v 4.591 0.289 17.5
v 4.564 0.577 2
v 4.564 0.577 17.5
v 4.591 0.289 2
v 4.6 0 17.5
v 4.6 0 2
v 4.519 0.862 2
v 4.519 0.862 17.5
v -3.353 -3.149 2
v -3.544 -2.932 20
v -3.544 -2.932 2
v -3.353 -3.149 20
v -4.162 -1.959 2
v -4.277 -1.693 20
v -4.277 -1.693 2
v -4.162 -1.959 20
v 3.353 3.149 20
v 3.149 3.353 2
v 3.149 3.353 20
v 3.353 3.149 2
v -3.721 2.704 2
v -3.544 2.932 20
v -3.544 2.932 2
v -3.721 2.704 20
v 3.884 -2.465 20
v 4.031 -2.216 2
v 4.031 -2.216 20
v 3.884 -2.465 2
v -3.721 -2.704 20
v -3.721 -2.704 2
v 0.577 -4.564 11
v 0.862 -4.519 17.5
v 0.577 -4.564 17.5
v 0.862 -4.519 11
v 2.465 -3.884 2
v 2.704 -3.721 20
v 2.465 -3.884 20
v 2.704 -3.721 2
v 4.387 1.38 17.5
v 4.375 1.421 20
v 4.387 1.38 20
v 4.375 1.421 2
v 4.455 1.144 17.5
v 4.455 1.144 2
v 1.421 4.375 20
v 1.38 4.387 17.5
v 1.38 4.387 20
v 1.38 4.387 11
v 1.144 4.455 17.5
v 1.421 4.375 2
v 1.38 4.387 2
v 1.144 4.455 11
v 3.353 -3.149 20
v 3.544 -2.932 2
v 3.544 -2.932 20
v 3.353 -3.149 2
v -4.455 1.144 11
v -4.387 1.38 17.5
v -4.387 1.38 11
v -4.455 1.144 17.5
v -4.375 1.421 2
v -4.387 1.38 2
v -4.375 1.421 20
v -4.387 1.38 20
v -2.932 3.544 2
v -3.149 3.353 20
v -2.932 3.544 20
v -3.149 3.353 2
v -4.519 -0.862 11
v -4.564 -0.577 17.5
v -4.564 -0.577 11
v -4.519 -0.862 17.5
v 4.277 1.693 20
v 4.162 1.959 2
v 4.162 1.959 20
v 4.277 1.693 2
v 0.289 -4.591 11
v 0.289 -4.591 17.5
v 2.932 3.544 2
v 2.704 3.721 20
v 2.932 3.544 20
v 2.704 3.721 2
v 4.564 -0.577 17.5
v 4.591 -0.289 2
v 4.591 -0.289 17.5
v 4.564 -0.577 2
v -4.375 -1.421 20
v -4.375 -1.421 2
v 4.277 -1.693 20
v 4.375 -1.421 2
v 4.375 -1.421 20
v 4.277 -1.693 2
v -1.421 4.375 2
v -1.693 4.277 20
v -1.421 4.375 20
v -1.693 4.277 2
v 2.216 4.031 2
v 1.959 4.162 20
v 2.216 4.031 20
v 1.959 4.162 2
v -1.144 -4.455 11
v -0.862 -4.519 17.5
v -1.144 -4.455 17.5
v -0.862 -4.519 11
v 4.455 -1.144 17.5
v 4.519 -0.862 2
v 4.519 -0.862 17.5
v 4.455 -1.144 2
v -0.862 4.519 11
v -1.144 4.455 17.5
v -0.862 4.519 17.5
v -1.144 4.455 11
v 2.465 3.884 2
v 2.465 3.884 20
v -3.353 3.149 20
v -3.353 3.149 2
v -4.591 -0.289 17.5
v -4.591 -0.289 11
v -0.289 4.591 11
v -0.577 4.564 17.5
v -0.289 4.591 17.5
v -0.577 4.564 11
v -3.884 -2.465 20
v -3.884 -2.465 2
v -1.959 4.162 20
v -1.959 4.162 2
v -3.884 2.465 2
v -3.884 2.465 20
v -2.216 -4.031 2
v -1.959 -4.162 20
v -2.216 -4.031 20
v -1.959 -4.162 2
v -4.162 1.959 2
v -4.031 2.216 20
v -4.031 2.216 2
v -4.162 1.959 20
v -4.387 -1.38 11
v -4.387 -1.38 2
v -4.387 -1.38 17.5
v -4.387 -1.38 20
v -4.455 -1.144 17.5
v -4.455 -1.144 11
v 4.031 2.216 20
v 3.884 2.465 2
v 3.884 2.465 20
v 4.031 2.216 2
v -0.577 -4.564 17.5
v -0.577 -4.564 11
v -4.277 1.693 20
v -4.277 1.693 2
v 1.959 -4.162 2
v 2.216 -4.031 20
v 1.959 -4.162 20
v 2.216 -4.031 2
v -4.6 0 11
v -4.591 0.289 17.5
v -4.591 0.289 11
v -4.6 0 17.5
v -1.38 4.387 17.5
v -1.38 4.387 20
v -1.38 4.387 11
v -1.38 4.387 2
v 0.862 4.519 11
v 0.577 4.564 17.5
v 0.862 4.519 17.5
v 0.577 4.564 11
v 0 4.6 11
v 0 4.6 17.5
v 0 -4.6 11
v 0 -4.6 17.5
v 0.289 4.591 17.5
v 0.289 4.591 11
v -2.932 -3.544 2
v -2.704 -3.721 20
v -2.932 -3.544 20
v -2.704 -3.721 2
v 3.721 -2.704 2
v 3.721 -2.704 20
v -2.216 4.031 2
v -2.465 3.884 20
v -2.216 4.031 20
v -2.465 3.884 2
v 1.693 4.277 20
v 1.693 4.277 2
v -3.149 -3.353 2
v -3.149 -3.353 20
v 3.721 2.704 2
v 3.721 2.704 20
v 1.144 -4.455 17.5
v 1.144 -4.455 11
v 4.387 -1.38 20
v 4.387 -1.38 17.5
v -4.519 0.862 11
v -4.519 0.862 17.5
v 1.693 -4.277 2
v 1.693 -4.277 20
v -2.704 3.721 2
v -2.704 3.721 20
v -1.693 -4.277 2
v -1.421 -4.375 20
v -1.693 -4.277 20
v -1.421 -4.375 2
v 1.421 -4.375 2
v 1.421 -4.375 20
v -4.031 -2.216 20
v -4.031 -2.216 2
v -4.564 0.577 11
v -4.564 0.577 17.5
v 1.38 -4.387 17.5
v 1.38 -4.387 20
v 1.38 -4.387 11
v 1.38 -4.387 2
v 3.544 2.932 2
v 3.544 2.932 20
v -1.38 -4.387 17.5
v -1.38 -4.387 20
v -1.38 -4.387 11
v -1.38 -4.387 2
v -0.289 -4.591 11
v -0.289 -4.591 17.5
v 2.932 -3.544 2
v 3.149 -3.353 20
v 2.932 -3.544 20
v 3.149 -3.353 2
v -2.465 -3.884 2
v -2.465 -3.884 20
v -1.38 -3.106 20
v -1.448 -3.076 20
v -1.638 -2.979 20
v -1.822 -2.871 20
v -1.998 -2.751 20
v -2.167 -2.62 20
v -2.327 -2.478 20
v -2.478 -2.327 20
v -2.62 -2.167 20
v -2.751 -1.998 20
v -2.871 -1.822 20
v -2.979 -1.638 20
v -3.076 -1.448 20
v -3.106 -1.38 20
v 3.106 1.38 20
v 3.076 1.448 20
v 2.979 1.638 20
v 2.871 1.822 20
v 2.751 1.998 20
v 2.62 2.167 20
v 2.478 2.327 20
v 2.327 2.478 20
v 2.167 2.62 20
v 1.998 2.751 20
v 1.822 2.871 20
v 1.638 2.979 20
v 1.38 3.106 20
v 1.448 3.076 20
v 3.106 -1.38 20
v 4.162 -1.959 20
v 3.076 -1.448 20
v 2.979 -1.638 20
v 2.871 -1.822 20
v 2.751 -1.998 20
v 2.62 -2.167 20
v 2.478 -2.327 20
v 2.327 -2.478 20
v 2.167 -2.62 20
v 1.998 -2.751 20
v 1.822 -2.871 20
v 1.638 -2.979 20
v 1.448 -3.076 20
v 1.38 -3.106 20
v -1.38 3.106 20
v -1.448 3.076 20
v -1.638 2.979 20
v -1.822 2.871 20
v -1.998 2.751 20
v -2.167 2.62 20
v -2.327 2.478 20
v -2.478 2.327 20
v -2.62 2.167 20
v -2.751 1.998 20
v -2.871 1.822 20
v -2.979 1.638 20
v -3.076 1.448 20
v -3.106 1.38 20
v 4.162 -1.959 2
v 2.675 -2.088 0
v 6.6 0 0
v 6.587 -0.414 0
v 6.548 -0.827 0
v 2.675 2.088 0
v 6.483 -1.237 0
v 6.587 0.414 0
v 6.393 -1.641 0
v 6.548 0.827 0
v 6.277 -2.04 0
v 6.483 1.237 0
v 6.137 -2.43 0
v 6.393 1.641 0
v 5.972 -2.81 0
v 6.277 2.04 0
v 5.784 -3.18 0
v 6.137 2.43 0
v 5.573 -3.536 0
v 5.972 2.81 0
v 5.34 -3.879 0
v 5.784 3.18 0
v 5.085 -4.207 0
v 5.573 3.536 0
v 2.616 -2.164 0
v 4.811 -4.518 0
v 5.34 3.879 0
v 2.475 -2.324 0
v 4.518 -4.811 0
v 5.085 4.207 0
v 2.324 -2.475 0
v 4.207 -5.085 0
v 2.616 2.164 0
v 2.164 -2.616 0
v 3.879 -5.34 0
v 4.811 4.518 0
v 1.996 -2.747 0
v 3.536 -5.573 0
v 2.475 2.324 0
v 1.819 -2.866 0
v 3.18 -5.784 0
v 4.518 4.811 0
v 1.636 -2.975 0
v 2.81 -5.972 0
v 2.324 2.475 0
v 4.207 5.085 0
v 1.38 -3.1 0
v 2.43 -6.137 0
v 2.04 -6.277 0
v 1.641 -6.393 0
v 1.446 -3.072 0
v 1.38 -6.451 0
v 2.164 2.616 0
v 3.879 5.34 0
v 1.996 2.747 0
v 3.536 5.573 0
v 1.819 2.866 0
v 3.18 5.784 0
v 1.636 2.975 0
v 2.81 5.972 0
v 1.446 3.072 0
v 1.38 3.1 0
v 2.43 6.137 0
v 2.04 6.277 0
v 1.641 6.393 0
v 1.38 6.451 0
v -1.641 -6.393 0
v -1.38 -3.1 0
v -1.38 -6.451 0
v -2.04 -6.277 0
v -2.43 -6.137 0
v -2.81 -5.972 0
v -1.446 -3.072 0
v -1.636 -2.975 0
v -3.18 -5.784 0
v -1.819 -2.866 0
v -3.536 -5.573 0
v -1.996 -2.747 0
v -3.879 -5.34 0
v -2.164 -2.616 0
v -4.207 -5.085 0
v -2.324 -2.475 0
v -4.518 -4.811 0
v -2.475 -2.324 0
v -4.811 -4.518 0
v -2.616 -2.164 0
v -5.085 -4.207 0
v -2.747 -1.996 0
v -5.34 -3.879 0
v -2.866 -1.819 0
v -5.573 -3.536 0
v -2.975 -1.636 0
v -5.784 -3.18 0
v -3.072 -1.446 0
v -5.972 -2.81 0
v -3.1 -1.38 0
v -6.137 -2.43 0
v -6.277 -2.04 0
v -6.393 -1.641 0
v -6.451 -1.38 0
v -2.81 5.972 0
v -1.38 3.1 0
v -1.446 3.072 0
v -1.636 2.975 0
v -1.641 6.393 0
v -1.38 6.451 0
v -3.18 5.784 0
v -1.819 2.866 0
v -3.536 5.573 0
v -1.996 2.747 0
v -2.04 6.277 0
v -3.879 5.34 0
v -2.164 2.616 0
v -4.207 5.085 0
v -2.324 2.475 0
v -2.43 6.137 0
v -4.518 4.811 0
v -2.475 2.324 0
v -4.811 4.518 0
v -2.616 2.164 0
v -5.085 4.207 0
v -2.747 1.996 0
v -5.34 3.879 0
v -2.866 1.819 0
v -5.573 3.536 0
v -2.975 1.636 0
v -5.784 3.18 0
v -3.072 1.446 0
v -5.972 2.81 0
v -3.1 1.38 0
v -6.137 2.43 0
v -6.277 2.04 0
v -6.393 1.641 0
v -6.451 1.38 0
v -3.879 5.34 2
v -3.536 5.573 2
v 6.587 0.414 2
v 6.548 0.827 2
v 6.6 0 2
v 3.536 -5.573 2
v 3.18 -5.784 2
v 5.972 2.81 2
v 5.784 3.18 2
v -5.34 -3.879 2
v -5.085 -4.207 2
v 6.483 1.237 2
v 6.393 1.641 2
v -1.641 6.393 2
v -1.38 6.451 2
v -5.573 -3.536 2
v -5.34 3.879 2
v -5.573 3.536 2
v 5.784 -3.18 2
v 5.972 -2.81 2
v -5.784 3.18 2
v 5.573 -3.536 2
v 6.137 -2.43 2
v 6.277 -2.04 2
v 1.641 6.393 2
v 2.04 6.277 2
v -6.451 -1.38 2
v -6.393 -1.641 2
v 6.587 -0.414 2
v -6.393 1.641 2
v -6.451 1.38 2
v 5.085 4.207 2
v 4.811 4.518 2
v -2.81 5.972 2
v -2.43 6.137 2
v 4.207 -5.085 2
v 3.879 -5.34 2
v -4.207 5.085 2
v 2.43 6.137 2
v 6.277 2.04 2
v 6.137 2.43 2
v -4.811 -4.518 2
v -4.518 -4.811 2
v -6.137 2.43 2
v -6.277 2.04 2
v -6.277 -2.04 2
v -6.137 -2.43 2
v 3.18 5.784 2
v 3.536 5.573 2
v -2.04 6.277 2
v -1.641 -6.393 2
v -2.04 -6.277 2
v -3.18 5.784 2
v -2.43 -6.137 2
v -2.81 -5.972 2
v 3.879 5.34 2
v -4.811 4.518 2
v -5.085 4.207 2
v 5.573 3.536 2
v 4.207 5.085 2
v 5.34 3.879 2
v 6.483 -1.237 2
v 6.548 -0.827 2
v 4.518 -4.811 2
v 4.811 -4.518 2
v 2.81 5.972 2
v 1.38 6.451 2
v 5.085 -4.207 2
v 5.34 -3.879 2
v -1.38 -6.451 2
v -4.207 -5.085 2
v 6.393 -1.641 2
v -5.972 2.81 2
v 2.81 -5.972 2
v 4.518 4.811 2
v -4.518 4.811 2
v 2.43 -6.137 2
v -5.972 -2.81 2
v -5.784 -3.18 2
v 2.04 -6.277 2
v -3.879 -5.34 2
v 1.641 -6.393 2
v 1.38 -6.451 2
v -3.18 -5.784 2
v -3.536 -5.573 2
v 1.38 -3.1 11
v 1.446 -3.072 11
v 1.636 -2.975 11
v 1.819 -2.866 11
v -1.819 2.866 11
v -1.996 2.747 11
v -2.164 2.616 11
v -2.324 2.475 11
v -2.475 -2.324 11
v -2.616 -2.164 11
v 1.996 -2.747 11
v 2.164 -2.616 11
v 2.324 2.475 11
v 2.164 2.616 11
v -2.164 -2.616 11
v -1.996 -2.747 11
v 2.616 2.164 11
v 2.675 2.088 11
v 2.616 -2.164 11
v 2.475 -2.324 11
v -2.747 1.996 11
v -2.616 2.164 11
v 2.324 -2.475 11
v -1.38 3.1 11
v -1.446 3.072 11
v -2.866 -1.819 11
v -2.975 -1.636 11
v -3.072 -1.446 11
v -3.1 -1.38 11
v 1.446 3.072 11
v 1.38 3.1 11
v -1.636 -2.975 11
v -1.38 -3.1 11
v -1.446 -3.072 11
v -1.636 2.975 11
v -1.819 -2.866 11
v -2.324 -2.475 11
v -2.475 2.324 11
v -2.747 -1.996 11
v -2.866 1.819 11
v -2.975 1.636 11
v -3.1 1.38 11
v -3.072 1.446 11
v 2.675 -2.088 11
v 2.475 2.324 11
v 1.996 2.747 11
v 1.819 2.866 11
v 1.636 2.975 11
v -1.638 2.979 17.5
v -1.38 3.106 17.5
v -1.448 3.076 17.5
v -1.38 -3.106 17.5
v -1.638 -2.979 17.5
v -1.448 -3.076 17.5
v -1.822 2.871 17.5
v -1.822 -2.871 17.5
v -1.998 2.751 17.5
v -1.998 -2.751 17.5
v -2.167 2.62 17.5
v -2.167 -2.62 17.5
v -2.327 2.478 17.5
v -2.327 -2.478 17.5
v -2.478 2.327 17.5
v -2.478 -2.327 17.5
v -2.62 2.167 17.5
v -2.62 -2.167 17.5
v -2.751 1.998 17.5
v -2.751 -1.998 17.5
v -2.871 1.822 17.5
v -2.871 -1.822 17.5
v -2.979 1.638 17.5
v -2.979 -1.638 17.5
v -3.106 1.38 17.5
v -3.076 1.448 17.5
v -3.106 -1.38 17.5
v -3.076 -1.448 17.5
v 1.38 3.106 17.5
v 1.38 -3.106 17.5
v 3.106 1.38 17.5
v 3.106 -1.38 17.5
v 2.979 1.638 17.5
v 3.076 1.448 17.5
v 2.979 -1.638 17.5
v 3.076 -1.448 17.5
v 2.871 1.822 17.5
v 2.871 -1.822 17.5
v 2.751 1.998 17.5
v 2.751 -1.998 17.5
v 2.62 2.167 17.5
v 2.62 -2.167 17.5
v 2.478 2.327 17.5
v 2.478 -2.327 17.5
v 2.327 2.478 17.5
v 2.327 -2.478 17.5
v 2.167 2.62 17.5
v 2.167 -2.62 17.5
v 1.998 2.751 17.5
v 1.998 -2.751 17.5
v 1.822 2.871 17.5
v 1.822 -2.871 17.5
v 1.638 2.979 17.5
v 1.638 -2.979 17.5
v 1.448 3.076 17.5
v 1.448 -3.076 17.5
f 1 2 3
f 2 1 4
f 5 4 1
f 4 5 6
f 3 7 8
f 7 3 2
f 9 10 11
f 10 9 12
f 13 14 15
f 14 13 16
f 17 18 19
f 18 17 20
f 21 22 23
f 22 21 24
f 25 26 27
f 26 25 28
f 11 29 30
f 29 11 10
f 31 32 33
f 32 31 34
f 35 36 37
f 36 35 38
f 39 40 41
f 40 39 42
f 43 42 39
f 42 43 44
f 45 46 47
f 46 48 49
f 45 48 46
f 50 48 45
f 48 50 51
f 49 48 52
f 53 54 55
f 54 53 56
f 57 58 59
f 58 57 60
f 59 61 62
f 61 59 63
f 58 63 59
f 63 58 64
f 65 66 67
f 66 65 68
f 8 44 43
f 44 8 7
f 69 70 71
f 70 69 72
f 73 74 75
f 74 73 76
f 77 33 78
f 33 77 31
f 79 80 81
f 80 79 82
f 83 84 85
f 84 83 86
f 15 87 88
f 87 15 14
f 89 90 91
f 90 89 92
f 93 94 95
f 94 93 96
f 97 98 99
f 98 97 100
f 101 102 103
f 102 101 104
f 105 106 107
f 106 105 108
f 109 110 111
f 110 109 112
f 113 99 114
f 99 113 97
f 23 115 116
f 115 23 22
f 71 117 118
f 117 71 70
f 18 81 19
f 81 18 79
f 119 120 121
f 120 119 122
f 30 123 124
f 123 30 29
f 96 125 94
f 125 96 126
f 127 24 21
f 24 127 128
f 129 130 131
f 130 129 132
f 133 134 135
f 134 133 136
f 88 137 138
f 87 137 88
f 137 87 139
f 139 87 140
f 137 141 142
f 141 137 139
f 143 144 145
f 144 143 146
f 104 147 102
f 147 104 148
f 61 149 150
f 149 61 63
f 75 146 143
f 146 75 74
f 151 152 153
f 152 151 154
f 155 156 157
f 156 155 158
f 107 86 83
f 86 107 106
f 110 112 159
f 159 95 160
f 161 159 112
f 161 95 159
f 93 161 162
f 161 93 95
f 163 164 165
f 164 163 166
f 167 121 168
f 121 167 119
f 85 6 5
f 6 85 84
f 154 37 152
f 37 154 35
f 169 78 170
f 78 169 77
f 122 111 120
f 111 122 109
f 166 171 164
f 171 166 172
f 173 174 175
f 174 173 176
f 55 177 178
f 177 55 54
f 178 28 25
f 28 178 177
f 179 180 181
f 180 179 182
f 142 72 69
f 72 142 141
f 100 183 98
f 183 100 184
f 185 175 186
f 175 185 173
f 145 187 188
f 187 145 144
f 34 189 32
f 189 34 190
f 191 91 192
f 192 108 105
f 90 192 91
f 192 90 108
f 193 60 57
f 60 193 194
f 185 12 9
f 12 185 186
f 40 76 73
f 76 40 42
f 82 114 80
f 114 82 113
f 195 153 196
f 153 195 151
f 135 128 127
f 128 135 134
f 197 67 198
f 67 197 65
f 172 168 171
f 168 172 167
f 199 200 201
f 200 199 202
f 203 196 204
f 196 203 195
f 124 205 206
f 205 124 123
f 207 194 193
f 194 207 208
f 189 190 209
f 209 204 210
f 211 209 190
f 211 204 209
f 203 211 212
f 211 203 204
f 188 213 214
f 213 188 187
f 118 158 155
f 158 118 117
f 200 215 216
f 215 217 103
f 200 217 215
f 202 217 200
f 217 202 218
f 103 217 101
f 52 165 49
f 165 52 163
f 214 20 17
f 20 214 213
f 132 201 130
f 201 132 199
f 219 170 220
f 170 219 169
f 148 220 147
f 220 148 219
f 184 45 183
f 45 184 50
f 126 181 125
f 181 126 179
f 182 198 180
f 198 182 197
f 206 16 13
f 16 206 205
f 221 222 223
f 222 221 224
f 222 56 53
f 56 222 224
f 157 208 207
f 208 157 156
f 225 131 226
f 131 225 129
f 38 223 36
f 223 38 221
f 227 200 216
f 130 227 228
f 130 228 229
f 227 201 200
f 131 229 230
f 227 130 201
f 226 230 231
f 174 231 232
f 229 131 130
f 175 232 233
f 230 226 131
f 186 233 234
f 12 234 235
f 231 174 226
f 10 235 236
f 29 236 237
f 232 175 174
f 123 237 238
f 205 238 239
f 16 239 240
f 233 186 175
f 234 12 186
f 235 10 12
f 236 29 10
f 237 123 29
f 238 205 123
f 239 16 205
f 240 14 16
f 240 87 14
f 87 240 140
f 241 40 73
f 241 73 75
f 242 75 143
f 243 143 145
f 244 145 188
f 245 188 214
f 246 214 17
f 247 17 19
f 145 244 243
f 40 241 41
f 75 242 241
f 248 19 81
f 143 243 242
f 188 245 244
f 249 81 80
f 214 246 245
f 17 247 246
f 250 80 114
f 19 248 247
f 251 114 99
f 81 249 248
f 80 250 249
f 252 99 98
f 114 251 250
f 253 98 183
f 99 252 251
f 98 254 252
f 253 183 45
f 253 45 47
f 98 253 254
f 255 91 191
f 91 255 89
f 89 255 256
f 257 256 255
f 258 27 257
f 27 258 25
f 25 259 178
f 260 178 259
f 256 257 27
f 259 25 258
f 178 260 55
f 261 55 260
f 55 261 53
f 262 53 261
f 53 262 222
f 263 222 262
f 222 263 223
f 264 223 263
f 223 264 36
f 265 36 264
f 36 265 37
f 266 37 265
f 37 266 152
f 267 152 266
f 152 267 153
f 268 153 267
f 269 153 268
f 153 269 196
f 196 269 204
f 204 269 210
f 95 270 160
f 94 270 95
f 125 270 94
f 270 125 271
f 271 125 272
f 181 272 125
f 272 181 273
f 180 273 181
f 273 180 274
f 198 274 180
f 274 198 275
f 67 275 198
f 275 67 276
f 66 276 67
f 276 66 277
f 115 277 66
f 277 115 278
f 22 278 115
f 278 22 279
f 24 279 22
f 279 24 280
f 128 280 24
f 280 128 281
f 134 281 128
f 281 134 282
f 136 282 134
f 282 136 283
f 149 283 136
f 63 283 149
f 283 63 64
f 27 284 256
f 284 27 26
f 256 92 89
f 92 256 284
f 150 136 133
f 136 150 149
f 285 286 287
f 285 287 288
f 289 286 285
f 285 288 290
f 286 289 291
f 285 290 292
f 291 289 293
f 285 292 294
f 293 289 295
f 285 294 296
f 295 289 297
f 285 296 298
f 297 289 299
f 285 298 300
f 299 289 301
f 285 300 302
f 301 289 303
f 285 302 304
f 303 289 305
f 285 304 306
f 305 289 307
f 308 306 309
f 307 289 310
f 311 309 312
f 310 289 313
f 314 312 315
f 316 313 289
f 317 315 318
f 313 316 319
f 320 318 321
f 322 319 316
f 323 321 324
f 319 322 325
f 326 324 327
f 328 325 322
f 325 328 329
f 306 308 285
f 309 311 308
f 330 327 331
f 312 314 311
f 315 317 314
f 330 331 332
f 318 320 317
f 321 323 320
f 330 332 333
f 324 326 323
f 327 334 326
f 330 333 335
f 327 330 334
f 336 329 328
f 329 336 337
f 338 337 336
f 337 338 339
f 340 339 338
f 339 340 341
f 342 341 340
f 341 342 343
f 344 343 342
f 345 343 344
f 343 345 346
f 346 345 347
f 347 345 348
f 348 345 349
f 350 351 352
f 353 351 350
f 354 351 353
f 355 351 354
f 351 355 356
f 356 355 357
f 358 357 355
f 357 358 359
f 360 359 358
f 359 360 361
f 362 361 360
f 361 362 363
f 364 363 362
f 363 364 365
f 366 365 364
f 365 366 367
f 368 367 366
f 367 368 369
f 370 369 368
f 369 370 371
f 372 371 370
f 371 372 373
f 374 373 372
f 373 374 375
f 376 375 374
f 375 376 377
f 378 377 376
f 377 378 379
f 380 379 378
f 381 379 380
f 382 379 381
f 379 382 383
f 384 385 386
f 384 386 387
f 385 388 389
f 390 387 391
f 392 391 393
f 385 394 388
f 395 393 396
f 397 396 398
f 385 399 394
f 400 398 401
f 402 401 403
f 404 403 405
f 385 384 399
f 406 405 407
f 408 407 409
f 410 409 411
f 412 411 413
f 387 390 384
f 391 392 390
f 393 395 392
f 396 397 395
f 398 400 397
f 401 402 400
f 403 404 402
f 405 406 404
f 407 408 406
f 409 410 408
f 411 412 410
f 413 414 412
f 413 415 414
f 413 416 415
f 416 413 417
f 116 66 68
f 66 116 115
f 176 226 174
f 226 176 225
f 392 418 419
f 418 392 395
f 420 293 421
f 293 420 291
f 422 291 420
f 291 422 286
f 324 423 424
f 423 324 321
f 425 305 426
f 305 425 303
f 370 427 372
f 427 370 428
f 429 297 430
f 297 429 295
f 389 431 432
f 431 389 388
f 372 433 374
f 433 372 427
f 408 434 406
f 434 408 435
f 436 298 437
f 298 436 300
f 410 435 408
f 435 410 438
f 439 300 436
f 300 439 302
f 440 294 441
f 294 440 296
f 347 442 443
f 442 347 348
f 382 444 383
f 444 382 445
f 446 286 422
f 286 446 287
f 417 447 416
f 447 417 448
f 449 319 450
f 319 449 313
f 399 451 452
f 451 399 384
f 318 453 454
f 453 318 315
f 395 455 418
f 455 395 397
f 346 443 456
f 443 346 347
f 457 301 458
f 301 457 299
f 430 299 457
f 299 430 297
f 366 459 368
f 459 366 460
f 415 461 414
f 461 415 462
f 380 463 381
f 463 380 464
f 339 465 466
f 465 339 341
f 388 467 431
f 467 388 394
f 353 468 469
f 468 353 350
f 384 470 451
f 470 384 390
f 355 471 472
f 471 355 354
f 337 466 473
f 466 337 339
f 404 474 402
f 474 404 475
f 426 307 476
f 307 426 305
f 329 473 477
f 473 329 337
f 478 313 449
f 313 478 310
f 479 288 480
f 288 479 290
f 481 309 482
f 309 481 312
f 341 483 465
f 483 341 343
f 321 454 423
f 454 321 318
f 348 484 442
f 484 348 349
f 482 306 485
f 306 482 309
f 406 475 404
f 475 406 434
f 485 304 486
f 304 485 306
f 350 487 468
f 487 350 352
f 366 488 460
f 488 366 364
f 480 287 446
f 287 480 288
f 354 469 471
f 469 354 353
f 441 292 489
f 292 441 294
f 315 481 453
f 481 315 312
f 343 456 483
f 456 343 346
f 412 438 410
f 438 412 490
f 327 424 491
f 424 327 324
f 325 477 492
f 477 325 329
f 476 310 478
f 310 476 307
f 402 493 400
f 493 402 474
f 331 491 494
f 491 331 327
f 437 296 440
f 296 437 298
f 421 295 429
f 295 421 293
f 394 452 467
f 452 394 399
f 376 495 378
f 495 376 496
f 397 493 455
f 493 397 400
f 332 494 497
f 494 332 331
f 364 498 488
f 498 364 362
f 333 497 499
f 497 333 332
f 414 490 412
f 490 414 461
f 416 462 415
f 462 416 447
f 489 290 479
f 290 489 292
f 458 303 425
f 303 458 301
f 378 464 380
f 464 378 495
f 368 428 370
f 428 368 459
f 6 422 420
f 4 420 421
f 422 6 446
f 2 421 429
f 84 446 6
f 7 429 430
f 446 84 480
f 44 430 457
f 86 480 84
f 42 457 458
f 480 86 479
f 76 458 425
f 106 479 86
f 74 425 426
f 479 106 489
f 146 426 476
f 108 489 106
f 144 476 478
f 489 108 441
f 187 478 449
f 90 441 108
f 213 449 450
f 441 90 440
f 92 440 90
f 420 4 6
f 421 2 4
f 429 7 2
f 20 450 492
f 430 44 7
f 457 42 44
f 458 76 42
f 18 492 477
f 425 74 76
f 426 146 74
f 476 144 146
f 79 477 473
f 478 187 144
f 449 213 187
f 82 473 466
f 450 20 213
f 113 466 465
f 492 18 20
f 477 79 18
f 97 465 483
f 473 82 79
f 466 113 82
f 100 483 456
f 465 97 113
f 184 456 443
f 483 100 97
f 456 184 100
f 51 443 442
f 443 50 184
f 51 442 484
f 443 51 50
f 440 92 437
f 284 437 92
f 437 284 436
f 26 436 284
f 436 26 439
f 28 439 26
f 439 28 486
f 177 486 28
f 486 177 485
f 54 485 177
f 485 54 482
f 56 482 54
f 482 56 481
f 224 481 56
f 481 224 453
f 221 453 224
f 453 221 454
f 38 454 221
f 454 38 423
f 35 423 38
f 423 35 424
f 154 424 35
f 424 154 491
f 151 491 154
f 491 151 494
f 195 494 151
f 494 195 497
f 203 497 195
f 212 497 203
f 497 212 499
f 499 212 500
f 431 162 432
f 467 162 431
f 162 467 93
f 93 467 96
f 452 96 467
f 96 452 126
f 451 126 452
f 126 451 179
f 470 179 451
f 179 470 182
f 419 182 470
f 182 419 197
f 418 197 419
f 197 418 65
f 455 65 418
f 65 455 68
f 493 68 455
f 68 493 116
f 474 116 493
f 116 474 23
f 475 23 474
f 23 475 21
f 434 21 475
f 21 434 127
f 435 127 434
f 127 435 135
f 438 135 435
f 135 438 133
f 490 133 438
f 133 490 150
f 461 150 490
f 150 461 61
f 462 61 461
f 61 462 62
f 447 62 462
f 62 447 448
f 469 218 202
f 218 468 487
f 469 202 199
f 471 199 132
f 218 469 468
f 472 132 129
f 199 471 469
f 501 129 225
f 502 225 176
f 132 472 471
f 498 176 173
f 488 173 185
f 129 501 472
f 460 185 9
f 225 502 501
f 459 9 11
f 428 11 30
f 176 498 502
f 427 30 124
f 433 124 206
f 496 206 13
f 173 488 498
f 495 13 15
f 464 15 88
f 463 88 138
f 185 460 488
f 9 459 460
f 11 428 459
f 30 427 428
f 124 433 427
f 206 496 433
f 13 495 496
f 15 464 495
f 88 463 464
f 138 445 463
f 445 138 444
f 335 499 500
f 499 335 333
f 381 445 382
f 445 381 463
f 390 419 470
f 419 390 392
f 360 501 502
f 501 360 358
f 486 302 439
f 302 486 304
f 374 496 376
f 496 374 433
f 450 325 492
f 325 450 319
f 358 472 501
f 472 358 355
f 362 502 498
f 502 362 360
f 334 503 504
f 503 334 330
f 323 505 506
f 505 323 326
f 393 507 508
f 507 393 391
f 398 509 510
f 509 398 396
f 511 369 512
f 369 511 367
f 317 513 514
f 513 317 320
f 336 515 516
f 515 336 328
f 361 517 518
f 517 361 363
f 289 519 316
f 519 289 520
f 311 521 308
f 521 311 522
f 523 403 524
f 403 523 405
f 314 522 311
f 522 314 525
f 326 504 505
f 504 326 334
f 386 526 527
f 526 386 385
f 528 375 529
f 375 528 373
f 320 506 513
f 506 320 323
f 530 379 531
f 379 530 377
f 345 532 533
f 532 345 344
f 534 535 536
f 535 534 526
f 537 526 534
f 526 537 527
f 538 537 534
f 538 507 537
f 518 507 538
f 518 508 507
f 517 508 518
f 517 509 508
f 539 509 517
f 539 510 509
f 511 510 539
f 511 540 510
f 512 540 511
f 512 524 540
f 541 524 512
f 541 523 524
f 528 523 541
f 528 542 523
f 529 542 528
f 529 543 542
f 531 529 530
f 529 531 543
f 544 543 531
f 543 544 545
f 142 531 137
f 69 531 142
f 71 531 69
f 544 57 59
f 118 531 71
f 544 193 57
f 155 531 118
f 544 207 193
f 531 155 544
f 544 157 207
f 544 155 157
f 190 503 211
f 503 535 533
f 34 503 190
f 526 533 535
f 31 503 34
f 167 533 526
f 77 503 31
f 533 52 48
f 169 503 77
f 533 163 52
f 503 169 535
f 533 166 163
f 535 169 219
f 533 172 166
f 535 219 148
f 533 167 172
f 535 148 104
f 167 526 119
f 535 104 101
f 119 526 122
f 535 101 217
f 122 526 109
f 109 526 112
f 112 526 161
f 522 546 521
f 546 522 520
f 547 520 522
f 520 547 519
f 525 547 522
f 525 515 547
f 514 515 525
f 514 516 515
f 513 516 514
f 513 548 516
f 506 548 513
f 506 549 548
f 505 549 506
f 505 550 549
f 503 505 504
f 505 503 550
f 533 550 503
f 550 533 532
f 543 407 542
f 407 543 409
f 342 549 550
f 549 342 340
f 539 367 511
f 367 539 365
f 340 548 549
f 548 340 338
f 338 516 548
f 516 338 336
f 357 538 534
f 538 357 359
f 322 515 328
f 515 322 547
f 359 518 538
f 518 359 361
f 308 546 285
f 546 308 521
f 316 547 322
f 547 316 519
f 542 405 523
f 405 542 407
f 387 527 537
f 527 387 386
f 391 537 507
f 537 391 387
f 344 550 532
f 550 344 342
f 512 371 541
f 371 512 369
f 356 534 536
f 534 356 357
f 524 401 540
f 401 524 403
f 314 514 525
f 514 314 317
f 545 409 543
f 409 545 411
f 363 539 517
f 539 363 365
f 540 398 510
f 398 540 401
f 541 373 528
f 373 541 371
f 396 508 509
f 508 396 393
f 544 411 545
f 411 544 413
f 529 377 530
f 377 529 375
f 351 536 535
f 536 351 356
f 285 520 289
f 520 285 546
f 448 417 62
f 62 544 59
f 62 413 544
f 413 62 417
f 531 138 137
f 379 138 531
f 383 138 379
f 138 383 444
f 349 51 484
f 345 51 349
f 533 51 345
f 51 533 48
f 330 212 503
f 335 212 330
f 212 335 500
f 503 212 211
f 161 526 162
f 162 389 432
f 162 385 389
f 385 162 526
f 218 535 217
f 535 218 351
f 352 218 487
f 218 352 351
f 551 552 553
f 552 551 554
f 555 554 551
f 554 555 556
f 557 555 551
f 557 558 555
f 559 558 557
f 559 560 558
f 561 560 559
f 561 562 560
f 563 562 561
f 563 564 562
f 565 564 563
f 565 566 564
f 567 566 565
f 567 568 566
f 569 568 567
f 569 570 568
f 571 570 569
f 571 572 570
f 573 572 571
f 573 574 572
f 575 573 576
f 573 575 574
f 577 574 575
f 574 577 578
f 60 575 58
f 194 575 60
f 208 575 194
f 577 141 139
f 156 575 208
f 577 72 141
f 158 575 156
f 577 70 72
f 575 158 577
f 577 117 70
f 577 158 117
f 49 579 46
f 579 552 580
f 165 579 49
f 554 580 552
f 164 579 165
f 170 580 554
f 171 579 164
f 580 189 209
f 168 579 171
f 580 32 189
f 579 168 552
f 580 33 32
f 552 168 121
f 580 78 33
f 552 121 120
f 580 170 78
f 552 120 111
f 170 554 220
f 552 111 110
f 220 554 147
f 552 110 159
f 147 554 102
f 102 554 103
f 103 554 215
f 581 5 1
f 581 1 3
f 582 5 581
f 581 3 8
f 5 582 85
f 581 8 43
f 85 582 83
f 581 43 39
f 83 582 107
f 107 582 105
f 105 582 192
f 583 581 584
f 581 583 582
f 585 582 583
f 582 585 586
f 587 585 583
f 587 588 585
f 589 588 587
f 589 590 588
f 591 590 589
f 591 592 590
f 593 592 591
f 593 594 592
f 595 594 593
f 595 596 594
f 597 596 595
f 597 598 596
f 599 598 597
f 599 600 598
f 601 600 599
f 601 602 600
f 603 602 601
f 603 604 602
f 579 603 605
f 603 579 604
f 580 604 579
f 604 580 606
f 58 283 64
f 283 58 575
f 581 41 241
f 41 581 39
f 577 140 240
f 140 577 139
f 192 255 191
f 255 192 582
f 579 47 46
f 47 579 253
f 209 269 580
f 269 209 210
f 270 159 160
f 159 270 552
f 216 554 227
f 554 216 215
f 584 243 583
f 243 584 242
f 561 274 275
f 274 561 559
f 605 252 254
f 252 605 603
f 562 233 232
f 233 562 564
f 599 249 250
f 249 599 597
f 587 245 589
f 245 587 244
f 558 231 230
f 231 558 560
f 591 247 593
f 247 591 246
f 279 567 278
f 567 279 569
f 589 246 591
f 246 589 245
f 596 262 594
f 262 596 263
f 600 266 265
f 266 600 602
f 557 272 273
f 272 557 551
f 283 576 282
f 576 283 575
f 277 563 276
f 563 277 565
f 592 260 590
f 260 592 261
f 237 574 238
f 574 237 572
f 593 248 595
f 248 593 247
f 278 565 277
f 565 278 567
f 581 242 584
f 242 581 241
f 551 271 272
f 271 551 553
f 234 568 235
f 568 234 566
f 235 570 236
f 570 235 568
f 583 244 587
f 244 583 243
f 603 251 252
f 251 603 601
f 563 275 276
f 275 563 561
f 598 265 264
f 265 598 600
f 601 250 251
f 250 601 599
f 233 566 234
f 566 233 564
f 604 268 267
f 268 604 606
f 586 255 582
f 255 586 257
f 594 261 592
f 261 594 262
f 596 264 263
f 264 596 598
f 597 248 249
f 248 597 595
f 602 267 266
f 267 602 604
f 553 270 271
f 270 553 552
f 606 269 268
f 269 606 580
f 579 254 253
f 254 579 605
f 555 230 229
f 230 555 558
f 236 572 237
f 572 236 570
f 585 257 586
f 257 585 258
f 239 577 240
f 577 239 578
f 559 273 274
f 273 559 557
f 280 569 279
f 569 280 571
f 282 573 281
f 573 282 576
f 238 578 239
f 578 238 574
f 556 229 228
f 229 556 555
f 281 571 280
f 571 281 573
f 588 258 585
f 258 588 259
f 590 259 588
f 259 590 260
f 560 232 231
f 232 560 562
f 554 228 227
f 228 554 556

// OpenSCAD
// Units are mm.

$fn = 100;
real_shaft_radius = 6.39/2; // Measured shaft.
shaft_radius = real_shaft_radius + 0.2;  // Adjust for 3D printer.
d_diameter = 5.77; // Distance from D surface to other side of shaft.
real_d_radius = d_diameter - real_shaft_radius;
d_radius = real_d_radius + 0.1; // Adjust for 3D printer.
shaft_insert = 11;  // 5 for test
real_magnet_radius = 3;
magnet_radius = real_magnet_radius + 0.4; // Adjust for 3D printer.
magnet_height = 2.5;
wall_thickness = 1.2; // Multiple of 0.4, which is filament diameter.
adapter_radius = max(shaft_radius, magnet_radius) + wall_thickness;
adapter_height = 20; // At least shaft_insert + magnet_height. 10 for test.
foot_height = 2;
foot_radius = adapter_radius + 2;

// Make the shaft, vertically along Z axis, starting at Z = 0 and
// going for height.
module shaft(height) {
    difference() {
        cylinder(height, shaft_radius, shaft_radius);
        translate([d_radius, -shaft_radius*2, -1]) {
            cube([shaft_radius*4, shaft_radius*4, height + 2]);
        }
    }
}

// Make the magnet along Z axis, starting at Z = 0.
module magnet(extra_height) {
    cylinder(magnet_height + extra_height, magnet_radius, magnet_radius);
}

module big_x(height, height_below, height_above, skip_positive_x) {
    total_height = height + height_below + height_above;
    translate([0, 0, total_height/2 - height_below]) {
        translate([-adapter_radius, 0, 0]) {
            cube([adapter_radius*2, adapter_radius*0.6, total_height], center=true);
        }
        if (!skip_positive_x) {
            translate([adapter_radius, 0, 0]) {
                cube([adapter_radius*2, adapter_radius*0.6, total_height], center=true);
            }
        }
        cube([adapter_radius*0.6, adapter_radius*3, total_height], center=true);
    }
}

// Make the magnet adapter along Z axis, starting at Z = 0
// and with given height.
module magnet_adapter(height) {
    difference() {
        union() {
            cylinder(height, adapter_radius, adapter_radius);
            cylinder(foot_height, foot_radius, foot_radius);
        }
        translate([0, 0, -1]) {
            shaft(shaft_insert + 1);
            big_x(shaft_insert + 1, 1, 0, true);
        }
        translate([0, 0, height - magnet_height]) {
            magnet(1);
            big_x(magnet_height, 0, 1, false);
        }
    }
}

magnet_adapter(adapter_height);
